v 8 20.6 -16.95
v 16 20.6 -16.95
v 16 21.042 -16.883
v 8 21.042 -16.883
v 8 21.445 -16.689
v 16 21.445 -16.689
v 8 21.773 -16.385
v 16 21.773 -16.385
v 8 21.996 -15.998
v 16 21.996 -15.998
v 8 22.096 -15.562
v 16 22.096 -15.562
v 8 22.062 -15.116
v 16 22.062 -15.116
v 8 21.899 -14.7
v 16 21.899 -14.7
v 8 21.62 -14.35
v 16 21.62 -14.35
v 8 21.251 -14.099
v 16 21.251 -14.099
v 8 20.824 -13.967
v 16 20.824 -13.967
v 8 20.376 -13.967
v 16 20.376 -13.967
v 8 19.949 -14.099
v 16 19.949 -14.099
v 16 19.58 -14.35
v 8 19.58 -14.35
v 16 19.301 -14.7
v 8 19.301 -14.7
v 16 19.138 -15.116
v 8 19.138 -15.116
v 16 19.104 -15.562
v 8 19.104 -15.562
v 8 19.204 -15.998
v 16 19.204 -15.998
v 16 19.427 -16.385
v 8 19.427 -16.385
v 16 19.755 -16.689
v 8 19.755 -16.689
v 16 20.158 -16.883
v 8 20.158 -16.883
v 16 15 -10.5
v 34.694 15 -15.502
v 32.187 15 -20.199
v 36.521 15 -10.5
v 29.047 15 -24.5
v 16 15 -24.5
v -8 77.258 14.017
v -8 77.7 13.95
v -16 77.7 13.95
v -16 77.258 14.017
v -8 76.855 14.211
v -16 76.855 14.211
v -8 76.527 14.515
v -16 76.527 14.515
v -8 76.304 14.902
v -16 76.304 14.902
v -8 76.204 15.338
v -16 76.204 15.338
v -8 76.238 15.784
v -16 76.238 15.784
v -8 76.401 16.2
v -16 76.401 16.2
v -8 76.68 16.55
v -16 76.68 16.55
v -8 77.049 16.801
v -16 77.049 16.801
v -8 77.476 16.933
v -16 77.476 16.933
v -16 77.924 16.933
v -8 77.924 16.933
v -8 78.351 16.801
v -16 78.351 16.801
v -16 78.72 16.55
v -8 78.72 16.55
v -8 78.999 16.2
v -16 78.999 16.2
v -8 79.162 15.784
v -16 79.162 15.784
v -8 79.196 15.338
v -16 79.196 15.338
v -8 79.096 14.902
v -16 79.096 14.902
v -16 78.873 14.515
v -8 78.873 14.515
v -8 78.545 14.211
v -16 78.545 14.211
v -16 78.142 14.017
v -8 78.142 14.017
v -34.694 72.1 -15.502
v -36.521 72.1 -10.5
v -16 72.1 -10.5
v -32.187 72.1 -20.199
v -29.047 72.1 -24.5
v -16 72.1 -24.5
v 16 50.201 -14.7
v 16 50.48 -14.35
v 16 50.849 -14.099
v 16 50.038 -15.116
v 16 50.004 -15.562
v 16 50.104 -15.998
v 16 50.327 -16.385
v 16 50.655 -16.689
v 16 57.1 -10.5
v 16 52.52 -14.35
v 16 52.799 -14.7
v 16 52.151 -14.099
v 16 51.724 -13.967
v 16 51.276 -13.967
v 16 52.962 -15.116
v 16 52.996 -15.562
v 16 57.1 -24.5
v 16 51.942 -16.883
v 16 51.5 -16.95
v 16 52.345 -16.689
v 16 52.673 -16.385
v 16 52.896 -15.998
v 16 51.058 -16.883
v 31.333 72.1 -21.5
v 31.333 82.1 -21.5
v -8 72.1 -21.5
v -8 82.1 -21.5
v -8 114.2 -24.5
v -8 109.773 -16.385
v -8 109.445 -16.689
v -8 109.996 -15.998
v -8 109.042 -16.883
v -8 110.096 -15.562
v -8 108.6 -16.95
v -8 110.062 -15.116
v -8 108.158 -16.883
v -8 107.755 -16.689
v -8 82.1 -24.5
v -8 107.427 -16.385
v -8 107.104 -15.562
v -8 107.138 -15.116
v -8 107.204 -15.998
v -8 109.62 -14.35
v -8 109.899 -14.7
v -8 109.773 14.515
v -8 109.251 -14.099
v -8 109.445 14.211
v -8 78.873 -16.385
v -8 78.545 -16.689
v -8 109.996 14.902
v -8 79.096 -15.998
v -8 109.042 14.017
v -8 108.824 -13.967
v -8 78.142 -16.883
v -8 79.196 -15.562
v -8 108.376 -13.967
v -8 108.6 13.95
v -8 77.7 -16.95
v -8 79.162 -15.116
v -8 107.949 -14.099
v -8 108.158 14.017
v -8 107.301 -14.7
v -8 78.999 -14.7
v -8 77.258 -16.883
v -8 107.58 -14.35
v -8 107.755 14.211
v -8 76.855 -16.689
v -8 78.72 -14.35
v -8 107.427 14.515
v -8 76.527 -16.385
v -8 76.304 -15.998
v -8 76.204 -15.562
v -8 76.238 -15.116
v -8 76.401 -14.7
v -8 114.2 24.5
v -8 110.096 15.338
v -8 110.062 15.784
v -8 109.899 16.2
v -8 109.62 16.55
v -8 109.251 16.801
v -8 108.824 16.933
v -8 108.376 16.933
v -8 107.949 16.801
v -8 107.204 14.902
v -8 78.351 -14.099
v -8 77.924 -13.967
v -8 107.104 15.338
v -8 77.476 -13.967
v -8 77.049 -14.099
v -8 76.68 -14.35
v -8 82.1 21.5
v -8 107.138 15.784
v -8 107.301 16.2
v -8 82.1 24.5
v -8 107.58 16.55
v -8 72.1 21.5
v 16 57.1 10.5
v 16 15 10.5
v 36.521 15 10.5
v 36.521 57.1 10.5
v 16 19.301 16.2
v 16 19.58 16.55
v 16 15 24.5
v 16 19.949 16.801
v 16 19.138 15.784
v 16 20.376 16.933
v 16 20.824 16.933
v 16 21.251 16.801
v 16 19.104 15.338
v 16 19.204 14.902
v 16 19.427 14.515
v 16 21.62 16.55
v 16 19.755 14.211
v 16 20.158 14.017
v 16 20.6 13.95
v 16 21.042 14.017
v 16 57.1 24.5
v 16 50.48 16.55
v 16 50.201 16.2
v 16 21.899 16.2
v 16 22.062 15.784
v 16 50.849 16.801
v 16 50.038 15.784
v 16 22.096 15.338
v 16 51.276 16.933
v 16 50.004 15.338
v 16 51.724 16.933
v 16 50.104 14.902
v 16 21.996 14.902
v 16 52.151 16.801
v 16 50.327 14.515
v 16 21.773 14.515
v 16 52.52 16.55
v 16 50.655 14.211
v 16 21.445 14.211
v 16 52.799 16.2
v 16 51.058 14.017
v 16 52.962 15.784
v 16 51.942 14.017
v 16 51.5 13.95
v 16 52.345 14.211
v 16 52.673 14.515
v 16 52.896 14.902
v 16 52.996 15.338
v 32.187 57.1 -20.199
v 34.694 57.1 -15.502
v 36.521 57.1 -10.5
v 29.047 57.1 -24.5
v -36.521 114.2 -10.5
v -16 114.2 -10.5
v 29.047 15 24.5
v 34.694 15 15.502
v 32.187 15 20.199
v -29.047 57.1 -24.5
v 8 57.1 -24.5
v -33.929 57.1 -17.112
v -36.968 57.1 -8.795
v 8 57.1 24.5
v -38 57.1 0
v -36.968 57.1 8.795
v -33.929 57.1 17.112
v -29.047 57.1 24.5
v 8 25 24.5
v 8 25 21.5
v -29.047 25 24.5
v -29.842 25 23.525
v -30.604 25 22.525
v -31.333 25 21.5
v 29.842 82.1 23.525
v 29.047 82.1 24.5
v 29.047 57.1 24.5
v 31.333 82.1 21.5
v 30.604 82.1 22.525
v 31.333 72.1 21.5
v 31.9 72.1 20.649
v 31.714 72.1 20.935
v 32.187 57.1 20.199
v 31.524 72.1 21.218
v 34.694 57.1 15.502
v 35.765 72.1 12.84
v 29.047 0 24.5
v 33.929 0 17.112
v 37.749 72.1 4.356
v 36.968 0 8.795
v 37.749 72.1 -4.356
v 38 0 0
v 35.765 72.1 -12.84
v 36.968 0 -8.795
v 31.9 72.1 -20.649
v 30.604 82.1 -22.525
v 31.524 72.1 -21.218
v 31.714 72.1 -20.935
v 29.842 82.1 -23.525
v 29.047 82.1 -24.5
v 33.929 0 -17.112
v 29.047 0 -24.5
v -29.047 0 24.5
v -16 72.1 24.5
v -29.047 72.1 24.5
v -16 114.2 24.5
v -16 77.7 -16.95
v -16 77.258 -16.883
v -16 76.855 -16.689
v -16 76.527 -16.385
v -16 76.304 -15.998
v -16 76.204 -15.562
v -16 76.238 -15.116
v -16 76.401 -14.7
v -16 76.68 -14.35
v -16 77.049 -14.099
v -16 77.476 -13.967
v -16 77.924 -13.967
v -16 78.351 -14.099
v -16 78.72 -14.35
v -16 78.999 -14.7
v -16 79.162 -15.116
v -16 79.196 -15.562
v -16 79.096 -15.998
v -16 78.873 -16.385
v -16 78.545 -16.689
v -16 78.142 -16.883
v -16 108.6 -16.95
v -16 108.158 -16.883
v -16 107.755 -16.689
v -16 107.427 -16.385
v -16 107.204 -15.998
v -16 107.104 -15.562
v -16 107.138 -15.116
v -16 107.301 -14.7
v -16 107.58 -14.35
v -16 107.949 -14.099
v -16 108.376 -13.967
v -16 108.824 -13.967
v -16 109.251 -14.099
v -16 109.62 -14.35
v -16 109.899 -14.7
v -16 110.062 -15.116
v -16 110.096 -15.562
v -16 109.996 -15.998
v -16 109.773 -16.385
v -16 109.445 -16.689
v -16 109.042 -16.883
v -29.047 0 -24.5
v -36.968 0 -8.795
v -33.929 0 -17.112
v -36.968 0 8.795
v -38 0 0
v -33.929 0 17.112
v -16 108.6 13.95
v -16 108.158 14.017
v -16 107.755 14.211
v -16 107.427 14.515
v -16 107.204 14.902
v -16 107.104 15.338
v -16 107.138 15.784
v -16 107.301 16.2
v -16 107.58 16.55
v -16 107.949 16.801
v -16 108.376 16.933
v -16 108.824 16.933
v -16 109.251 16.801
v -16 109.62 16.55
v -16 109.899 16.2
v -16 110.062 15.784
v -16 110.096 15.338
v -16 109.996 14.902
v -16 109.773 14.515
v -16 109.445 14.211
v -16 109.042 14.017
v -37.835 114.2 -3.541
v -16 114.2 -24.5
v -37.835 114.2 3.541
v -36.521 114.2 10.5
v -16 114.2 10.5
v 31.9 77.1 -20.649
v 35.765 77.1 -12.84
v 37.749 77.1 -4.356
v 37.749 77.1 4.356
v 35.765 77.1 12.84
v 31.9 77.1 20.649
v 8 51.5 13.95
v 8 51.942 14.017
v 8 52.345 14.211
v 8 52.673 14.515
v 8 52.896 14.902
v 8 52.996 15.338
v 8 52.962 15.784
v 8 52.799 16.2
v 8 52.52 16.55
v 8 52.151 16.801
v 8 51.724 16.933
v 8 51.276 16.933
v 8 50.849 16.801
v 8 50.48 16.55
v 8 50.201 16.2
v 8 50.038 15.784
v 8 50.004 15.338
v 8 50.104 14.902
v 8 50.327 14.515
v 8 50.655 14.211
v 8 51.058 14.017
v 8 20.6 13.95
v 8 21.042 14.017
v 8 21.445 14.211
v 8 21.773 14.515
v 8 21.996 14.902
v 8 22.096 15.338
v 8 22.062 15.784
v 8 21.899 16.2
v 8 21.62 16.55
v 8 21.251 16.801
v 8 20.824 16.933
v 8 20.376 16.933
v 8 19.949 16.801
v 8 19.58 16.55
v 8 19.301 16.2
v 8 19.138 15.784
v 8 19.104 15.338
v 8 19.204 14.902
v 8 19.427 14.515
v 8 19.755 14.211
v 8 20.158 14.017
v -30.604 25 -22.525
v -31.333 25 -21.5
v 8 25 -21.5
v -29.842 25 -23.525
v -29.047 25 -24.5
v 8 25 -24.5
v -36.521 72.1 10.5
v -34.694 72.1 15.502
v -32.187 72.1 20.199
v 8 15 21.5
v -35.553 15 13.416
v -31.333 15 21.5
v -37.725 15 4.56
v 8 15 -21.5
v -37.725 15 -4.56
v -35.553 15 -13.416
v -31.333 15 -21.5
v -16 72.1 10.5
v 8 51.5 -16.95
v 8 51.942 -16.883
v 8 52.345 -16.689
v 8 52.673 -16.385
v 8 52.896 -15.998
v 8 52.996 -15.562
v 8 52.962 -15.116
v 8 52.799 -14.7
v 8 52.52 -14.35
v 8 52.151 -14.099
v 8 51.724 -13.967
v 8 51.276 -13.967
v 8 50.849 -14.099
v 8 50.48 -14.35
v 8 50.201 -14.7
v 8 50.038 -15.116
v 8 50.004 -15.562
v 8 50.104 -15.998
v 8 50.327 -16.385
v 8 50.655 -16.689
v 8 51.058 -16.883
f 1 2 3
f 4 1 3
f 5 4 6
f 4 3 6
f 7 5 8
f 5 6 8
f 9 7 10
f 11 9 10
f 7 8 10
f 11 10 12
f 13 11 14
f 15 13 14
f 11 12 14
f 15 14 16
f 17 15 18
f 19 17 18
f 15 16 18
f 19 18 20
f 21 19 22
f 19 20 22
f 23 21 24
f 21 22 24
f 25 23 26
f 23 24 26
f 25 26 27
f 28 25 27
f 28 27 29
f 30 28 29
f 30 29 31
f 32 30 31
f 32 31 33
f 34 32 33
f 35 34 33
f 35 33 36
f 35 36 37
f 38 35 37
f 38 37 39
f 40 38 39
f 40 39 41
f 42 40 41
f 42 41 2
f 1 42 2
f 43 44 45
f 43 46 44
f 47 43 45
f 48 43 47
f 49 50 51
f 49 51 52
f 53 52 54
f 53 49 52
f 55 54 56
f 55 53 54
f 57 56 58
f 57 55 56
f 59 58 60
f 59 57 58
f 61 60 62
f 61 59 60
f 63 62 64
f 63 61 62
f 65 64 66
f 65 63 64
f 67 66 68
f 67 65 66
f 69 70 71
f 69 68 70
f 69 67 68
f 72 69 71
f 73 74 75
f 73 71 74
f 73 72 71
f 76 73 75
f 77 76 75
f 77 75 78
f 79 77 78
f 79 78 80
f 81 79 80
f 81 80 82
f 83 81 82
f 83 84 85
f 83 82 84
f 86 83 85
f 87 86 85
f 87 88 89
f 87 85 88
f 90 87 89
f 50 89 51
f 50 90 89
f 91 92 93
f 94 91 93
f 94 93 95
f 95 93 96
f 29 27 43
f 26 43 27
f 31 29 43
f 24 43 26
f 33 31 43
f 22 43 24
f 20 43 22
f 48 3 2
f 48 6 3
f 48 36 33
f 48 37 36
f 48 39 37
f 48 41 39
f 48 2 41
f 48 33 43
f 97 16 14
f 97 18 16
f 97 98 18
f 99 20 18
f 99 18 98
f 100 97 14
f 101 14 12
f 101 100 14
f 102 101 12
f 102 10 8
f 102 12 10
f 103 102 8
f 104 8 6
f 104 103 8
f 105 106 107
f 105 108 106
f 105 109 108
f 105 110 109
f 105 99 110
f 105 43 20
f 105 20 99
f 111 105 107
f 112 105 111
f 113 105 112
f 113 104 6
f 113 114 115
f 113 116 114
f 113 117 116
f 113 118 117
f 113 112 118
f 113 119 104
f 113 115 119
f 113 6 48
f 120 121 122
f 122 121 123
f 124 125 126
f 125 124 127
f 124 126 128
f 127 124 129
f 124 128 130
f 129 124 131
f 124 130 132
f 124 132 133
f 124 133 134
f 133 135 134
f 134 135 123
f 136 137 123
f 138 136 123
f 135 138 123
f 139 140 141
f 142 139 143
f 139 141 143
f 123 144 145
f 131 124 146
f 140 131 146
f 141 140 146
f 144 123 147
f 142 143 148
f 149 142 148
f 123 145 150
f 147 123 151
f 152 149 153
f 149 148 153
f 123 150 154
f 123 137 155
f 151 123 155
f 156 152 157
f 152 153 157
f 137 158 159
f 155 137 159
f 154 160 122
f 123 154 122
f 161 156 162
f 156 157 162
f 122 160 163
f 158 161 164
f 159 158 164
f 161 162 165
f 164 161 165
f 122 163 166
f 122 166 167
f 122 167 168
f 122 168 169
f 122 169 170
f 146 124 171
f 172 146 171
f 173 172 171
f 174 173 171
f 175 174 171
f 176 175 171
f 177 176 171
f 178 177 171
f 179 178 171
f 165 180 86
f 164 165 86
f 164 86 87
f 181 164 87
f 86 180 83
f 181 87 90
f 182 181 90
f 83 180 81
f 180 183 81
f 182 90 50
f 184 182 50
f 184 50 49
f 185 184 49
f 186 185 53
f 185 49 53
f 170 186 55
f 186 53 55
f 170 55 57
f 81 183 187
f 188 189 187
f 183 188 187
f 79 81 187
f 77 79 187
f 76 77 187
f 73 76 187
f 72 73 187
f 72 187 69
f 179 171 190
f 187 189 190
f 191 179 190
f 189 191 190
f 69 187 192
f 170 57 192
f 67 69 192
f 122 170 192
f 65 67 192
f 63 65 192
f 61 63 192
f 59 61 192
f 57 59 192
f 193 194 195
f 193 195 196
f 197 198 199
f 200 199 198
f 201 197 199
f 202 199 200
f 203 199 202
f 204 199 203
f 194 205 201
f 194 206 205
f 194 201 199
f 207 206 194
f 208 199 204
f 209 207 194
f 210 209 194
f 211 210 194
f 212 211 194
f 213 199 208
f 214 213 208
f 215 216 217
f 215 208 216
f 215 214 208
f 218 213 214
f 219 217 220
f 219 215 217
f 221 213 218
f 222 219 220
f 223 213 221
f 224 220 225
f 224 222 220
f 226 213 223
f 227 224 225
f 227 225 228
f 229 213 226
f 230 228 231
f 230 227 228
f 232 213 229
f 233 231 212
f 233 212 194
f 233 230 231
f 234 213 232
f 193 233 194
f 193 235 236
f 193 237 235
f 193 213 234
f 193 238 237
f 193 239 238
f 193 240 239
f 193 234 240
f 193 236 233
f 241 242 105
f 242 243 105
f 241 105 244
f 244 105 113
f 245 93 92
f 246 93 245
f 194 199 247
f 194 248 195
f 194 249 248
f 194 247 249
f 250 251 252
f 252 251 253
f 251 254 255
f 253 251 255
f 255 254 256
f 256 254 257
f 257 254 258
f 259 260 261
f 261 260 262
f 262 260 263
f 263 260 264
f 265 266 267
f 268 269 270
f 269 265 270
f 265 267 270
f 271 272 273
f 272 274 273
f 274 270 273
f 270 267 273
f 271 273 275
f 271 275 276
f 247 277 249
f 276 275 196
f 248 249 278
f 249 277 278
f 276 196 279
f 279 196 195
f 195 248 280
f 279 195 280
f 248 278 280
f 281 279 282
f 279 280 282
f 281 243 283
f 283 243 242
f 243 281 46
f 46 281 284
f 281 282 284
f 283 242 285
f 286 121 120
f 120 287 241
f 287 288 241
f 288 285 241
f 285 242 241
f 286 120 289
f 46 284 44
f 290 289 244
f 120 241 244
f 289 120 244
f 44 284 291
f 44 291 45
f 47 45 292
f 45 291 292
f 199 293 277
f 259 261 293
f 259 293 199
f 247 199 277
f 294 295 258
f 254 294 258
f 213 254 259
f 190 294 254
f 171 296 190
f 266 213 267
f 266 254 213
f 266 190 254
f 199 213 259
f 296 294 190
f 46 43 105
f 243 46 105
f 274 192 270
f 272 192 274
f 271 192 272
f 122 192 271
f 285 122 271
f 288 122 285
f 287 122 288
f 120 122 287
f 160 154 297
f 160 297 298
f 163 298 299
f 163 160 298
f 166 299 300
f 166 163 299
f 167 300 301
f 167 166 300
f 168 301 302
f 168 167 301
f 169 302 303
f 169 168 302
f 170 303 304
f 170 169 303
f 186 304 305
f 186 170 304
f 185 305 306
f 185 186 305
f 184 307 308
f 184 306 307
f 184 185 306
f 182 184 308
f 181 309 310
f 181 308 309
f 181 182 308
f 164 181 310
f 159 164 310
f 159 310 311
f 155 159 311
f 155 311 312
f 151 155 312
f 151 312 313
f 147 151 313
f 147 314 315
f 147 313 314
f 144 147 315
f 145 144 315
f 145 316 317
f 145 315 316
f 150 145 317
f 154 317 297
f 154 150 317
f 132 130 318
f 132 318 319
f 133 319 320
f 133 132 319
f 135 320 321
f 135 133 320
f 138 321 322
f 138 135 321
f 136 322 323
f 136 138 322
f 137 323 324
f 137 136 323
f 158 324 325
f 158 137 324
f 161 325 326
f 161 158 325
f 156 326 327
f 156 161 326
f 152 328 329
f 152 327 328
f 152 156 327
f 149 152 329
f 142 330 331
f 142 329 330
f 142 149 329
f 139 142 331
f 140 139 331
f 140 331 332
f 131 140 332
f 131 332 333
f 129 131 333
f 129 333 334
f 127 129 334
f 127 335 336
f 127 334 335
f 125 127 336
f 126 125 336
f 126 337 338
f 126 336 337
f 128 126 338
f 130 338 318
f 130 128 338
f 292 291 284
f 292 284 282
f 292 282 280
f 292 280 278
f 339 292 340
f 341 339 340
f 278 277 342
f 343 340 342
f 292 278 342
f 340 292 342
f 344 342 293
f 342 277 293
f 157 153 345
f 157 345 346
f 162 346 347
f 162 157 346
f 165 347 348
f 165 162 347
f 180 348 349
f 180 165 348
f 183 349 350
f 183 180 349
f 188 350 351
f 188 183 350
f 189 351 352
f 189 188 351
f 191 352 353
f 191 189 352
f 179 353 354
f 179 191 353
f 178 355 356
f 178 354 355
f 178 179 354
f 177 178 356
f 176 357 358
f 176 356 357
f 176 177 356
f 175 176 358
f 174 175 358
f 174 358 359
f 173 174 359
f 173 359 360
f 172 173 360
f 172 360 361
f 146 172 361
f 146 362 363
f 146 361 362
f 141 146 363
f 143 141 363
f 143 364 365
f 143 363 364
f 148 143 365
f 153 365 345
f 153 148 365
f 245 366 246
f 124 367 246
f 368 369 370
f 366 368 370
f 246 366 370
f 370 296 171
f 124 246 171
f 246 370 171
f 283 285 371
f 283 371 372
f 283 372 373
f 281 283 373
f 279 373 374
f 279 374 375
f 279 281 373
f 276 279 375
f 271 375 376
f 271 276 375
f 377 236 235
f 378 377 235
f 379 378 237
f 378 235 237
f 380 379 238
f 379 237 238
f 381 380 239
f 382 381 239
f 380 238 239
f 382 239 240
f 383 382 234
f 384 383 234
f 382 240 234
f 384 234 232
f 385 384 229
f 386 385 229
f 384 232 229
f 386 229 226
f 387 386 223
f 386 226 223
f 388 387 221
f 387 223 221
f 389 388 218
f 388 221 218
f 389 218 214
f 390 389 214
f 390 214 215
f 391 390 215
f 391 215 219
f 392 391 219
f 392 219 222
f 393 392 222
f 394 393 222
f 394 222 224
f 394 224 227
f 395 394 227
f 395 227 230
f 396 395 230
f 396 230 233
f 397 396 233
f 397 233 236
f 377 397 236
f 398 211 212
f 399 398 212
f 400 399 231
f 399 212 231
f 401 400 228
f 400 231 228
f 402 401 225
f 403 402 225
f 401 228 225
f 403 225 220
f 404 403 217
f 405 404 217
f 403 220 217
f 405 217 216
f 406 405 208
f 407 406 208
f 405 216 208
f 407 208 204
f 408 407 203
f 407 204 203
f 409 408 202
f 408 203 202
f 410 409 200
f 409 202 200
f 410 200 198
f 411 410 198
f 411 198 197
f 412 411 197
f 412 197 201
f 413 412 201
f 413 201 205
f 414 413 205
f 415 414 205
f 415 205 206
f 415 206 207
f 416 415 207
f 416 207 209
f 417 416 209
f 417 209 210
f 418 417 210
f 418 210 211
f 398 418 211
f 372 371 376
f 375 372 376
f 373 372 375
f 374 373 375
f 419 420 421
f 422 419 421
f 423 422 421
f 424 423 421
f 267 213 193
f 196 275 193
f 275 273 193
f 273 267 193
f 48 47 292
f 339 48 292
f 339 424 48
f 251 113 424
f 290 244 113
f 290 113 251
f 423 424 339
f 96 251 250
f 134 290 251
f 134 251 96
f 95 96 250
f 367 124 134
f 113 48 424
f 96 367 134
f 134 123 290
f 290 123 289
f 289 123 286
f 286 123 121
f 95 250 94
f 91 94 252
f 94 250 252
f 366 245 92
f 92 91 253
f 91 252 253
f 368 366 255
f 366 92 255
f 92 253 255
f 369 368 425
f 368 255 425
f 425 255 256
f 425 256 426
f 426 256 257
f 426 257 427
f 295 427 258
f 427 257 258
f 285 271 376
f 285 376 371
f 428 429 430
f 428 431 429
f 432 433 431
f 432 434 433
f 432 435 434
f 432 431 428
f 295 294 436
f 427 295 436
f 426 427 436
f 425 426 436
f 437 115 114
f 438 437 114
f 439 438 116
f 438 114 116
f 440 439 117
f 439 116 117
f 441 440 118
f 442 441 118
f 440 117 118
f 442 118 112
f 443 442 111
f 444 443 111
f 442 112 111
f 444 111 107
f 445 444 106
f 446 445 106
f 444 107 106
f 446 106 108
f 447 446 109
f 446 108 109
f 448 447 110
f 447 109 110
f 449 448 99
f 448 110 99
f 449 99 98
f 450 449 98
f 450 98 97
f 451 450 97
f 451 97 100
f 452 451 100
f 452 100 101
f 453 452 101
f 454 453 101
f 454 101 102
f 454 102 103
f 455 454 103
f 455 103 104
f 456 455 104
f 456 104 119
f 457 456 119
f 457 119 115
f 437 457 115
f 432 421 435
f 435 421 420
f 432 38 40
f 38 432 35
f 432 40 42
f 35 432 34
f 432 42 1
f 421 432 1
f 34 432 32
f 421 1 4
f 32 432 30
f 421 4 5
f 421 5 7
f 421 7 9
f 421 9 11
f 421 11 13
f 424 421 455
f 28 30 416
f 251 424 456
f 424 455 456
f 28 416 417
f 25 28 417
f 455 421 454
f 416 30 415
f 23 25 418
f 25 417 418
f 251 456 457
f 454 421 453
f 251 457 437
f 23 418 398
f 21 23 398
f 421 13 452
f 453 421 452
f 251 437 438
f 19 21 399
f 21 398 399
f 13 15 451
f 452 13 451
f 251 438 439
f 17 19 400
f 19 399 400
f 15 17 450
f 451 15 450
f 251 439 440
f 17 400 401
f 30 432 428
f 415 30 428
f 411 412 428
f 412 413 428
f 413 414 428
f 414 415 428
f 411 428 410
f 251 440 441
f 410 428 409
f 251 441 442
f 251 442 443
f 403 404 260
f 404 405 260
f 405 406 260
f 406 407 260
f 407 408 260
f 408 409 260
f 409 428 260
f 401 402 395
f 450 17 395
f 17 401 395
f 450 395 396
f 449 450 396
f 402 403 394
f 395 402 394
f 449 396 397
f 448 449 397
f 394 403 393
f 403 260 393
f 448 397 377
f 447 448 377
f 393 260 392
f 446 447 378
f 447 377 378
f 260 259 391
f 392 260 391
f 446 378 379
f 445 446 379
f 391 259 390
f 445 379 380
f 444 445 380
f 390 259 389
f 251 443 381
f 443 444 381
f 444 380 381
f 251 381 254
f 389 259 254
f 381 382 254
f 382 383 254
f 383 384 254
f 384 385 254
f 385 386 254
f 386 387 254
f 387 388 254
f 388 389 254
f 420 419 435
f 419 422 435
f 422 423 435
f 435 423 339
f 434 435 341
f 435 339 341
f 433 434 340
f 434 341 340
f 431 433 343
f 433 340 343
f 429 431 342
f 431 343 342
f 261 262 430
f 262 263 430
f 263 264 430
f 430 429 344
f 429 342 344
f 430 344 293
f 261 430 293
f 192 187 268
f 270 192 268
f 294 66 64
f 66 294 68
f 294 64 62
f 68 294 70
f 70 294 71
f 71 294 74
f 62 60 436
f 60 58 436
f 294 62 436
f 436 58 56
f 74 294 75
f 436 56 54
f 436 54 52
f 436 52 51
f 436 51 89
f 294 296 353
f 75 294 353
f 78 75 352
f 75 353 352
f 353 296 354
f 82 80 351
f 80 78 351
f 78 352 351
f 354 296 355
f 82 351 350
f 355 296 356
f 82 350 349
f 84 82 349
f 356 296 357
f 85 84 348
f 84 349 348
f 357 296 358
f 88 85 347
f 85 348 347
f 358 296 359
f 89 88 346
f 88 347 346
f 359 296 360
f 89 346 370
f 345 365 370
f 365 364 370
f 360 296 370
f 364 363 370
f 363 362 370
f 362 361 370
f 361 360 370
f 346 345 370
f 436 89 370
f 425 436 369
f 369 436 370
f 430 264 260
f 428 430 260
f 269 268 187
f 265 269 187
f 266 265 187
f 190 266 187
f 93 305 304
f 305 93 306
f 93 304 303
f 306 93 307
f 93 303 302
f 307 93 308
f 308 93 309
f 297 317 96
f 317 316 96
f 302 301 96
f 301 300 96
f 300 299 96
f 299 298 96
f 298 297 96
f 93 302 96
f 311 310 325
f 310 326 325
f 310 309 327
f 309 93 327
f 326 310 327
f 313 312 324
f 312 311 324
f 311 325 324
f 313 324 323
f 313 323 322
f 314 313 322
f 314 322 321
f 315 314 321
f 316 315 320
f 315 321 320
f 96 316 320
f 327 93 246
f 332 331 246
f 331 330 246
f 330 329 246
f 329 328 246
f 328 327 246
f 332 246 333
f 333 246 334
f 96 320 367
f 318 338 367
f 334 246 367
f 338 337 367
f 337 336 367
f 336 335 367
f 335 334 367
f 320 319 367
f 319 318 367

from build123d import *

# Parameters (mm, degrees)
SKETCH1_W           = 76
SKETCH1_H           = 43
BOSS_EXTRUDE1_DEPTH = 15
SKETCH3_W           = 30
SKETCH3_H           = 43
BOSS_EXTRUDE2_DEPTH = 42.1
BOSS_EXTRUDE3_START = 42.1
SKETCH4_W           = 76
SKETCH4_H           = 43
BOSS_EXTRUDE3_DEPTH = 15
SKETCH5_W           = 30
SKETCH5_H           = 43
BOSS_EXTRUDE4_DEPTH = 42.1
BOSS_EXTRUDE5_DEPTH = 3
BOSS_EXTRUDE6_DEPTH = 3
SKETCH2_OUTSIDE_W   = 107.134
SKETCH2_OUTSIDE_H   = 80.134
SKETCH2_OUTSIDE_R   = 38
CUT_EXTRUDE1_DEPTH  = 123.82463108
BOSS_EXTRUDE7_DEPTH = 5
CUT_EXTRUDE2_START  = 16
SKETCH9_W           = 14
SKETCH9_H           = 42.1
CUT_EXTRUDE2_DEPTH  = 40
CUT_EXTRUDE3_START  = -8
SKETCH10_W          = 14
SKETCH10_H          = 42.1
CUT_EXTRUDE3_DEPTH  = 40
SKETCH11_R          = 1.5
CUT_EXTRUDE4_DEPTH  = 60


with BuildPart() as part:
    # Sketch1 → Boss-Extrude1 (new body)
    with BuildSketch(Plane(origin=(0, 0, 0), x_dir=(1, 0, 0), z_dir=(0, 1, 0))):
        Rectangle(SKETCH1_W, SKETCH1_H)
    extrude(amount=BOSS_EXTRUDE1_DEPTH)

    # Sketch3 → Boss-Extrude2 (add)
    with BuildSketch(Plane(origin=(0, 15, 0), x_dir=(1, 0, 0), z_dir=(0, 1, 0))):
        with Locations((23, 0)):
            Rectangle(SKETCH3_W, SKETCH3_H)
    extrude(amount=BOSS_EXTRUDE2_DEPTH)

    # Sketch4 → Boss-Extrude3 (add)
    with BuildSketch(Plane(origin=(0, 15, 0), x_dir=(1, 0, 0), z_dir=(0, 1, 0)).offset(BOSS_EXTRUDE3_START)):
        Rectangle(SKETCH4_W, SKETCH4_H)
    extrude(amount=BOSS_EXTRUDE3_DEPTH)

    # Sketch5 → Boss-Extrude4 (add)
    with BuildSketch(Plane(origin=(0, 72.1, 0), x_dir=(1, 0, 0), z_dir=(0, 1, 0))):
        with Locations((-23, 0)):
            Rectangle(SKETCH5_W, SKETCH5_H)
    extrude(amount=BOSS_EXTRUDE4_DEPTH)

    # Sketch6 → Boss-Extrude5 (add)
    with BuildSketch(Plane.XY.offset(21.5)):
        Polygon((-38, 0), (38, 0), (38, 82.1), (-8, 82.1), (-8, 114.2), (-38, 114.2), (-38, 57.1), (8, 57.1), (8, 25), (-38, 25), align=None)
    extrude(amount=BOSS_EXTRUDE5_DEPTH)

    # Sketch7 → Boss-Extrude6 (add)
    with BuildSketch(Plane(origin=(0, 0, -21.5), x_dir=(-1, 0, 0), z_dir=(0, 0, -1))):
        Polygon((-38, 0), (38, 0), (38, 15), (38, 25), (-8, 25), (-8, 57.1), (38, 57.1), (38, 114.2), (8, 114.2), (8, 82.1), (-38, 82.1), (-38, 72.1), align=None)
    extrude(amount=BOSS_EXTRUDE6_DEPTH)

    # Sketch2 outside → Cut-Extrude1 (cut, through all)
    with BuildSketch(Plane(origin=(0, 0, 0), x_dir=(1, 0, 0), z_dir=(0, 1, 0))):
        Rectangle(SKETCH2_OUTSIDE_W, SKETCH2_OUTSIDE_H)
        Circle(SKETCH2_OUTSIDE_R, mode=Mode.SUBTRACT)
    extrude(amount=CUT_EXTRUDE1_DEPTH, mode=Mode.SUBTRACT)

    # Sketch8 → Boss-Extrude7 (add)
    with BuildSketch(Plane(origin=(0, 72.1, 0), x_dir=(1, 0, 0), z_dir=(0, 1, 0))):
        with BuildLine():
            Line((31.9, -20.64921306), (31.9, 20.64921306))
            ThreePointArc((31.9, 20.64921306), (38, 0), (31.9, -20.64921306))
        make_face()
    extrude(amount=BOSS_EXTRUDE7_DEPTH)

    # Sketch9 → Cut-Extrude2 (cut)
    with BuildSketch(Plane(origin=(0, 0, 0), x_dir=(0, 0, -1), z_dir=(1, 0, 0)).offset(CUT_EXTRUDE2_START)):
        with Locations((-17.5, 36.05)):
            Rectangle(SKETCH9_W, SKETCH9_H)
        with Locations((17.5, 36.05)):
            Rectangle(SKETCH9_W, SKETCH9_H)
    extrude(amount=CUT_EXTRUDE2_DEPTH, mode=Mode.SUBTRACT)

    # Sketch10 → Cut-Extrude3 (cut)
    with BuildSketch(Plane(origin=(-8, 0, 0), x_dir=(0, 0, -1), z_dir=(1, 0, 0)).offset(CUT_EXTRUDE3_START)):
        with Locations((-17.5, 93.15)):
            Rectangle(SKETCH10_W, SKETCH10_H)
        with Locations((17.5, 93.15)):
            Rectangle(SKETCH10_W, SKETCH10_H)
    extrude(amount=-CUT_EXTRUDE3_DEPTH, mode=Mode.SUBTRACT)

    # Sketch11 → Cut-Extrude4 (cut)
    with BuildSketch(Plane(origin=(16, 0, 0), x_dir=(0, 0, -1), z_dir=(1, 0, 0))):
        with Locations((-15.45, 20.6)):
            Circle(SKETCH11_R)
        with Locations((15.45, 20.6)):
            Circle(SKETCH11_R)
        with Locations((15.45, 51.5)):
            Circle(SKETCH11_R)
        with Locations((-15.45, 51.5)):
            Circle(SKETCH11_R)
    cut_extrude4 = extrude(amount=-CUT_EXTRUDE4_DEPTH, mode=Mode.SUBTRACT)

    # Mirror1: Cut-Extrude4 across plane
    add(cut_extrude4.mirror(Plane.ZX.offset(64.6)), mode=Mode.SUBTRACT)


solid = part.part
